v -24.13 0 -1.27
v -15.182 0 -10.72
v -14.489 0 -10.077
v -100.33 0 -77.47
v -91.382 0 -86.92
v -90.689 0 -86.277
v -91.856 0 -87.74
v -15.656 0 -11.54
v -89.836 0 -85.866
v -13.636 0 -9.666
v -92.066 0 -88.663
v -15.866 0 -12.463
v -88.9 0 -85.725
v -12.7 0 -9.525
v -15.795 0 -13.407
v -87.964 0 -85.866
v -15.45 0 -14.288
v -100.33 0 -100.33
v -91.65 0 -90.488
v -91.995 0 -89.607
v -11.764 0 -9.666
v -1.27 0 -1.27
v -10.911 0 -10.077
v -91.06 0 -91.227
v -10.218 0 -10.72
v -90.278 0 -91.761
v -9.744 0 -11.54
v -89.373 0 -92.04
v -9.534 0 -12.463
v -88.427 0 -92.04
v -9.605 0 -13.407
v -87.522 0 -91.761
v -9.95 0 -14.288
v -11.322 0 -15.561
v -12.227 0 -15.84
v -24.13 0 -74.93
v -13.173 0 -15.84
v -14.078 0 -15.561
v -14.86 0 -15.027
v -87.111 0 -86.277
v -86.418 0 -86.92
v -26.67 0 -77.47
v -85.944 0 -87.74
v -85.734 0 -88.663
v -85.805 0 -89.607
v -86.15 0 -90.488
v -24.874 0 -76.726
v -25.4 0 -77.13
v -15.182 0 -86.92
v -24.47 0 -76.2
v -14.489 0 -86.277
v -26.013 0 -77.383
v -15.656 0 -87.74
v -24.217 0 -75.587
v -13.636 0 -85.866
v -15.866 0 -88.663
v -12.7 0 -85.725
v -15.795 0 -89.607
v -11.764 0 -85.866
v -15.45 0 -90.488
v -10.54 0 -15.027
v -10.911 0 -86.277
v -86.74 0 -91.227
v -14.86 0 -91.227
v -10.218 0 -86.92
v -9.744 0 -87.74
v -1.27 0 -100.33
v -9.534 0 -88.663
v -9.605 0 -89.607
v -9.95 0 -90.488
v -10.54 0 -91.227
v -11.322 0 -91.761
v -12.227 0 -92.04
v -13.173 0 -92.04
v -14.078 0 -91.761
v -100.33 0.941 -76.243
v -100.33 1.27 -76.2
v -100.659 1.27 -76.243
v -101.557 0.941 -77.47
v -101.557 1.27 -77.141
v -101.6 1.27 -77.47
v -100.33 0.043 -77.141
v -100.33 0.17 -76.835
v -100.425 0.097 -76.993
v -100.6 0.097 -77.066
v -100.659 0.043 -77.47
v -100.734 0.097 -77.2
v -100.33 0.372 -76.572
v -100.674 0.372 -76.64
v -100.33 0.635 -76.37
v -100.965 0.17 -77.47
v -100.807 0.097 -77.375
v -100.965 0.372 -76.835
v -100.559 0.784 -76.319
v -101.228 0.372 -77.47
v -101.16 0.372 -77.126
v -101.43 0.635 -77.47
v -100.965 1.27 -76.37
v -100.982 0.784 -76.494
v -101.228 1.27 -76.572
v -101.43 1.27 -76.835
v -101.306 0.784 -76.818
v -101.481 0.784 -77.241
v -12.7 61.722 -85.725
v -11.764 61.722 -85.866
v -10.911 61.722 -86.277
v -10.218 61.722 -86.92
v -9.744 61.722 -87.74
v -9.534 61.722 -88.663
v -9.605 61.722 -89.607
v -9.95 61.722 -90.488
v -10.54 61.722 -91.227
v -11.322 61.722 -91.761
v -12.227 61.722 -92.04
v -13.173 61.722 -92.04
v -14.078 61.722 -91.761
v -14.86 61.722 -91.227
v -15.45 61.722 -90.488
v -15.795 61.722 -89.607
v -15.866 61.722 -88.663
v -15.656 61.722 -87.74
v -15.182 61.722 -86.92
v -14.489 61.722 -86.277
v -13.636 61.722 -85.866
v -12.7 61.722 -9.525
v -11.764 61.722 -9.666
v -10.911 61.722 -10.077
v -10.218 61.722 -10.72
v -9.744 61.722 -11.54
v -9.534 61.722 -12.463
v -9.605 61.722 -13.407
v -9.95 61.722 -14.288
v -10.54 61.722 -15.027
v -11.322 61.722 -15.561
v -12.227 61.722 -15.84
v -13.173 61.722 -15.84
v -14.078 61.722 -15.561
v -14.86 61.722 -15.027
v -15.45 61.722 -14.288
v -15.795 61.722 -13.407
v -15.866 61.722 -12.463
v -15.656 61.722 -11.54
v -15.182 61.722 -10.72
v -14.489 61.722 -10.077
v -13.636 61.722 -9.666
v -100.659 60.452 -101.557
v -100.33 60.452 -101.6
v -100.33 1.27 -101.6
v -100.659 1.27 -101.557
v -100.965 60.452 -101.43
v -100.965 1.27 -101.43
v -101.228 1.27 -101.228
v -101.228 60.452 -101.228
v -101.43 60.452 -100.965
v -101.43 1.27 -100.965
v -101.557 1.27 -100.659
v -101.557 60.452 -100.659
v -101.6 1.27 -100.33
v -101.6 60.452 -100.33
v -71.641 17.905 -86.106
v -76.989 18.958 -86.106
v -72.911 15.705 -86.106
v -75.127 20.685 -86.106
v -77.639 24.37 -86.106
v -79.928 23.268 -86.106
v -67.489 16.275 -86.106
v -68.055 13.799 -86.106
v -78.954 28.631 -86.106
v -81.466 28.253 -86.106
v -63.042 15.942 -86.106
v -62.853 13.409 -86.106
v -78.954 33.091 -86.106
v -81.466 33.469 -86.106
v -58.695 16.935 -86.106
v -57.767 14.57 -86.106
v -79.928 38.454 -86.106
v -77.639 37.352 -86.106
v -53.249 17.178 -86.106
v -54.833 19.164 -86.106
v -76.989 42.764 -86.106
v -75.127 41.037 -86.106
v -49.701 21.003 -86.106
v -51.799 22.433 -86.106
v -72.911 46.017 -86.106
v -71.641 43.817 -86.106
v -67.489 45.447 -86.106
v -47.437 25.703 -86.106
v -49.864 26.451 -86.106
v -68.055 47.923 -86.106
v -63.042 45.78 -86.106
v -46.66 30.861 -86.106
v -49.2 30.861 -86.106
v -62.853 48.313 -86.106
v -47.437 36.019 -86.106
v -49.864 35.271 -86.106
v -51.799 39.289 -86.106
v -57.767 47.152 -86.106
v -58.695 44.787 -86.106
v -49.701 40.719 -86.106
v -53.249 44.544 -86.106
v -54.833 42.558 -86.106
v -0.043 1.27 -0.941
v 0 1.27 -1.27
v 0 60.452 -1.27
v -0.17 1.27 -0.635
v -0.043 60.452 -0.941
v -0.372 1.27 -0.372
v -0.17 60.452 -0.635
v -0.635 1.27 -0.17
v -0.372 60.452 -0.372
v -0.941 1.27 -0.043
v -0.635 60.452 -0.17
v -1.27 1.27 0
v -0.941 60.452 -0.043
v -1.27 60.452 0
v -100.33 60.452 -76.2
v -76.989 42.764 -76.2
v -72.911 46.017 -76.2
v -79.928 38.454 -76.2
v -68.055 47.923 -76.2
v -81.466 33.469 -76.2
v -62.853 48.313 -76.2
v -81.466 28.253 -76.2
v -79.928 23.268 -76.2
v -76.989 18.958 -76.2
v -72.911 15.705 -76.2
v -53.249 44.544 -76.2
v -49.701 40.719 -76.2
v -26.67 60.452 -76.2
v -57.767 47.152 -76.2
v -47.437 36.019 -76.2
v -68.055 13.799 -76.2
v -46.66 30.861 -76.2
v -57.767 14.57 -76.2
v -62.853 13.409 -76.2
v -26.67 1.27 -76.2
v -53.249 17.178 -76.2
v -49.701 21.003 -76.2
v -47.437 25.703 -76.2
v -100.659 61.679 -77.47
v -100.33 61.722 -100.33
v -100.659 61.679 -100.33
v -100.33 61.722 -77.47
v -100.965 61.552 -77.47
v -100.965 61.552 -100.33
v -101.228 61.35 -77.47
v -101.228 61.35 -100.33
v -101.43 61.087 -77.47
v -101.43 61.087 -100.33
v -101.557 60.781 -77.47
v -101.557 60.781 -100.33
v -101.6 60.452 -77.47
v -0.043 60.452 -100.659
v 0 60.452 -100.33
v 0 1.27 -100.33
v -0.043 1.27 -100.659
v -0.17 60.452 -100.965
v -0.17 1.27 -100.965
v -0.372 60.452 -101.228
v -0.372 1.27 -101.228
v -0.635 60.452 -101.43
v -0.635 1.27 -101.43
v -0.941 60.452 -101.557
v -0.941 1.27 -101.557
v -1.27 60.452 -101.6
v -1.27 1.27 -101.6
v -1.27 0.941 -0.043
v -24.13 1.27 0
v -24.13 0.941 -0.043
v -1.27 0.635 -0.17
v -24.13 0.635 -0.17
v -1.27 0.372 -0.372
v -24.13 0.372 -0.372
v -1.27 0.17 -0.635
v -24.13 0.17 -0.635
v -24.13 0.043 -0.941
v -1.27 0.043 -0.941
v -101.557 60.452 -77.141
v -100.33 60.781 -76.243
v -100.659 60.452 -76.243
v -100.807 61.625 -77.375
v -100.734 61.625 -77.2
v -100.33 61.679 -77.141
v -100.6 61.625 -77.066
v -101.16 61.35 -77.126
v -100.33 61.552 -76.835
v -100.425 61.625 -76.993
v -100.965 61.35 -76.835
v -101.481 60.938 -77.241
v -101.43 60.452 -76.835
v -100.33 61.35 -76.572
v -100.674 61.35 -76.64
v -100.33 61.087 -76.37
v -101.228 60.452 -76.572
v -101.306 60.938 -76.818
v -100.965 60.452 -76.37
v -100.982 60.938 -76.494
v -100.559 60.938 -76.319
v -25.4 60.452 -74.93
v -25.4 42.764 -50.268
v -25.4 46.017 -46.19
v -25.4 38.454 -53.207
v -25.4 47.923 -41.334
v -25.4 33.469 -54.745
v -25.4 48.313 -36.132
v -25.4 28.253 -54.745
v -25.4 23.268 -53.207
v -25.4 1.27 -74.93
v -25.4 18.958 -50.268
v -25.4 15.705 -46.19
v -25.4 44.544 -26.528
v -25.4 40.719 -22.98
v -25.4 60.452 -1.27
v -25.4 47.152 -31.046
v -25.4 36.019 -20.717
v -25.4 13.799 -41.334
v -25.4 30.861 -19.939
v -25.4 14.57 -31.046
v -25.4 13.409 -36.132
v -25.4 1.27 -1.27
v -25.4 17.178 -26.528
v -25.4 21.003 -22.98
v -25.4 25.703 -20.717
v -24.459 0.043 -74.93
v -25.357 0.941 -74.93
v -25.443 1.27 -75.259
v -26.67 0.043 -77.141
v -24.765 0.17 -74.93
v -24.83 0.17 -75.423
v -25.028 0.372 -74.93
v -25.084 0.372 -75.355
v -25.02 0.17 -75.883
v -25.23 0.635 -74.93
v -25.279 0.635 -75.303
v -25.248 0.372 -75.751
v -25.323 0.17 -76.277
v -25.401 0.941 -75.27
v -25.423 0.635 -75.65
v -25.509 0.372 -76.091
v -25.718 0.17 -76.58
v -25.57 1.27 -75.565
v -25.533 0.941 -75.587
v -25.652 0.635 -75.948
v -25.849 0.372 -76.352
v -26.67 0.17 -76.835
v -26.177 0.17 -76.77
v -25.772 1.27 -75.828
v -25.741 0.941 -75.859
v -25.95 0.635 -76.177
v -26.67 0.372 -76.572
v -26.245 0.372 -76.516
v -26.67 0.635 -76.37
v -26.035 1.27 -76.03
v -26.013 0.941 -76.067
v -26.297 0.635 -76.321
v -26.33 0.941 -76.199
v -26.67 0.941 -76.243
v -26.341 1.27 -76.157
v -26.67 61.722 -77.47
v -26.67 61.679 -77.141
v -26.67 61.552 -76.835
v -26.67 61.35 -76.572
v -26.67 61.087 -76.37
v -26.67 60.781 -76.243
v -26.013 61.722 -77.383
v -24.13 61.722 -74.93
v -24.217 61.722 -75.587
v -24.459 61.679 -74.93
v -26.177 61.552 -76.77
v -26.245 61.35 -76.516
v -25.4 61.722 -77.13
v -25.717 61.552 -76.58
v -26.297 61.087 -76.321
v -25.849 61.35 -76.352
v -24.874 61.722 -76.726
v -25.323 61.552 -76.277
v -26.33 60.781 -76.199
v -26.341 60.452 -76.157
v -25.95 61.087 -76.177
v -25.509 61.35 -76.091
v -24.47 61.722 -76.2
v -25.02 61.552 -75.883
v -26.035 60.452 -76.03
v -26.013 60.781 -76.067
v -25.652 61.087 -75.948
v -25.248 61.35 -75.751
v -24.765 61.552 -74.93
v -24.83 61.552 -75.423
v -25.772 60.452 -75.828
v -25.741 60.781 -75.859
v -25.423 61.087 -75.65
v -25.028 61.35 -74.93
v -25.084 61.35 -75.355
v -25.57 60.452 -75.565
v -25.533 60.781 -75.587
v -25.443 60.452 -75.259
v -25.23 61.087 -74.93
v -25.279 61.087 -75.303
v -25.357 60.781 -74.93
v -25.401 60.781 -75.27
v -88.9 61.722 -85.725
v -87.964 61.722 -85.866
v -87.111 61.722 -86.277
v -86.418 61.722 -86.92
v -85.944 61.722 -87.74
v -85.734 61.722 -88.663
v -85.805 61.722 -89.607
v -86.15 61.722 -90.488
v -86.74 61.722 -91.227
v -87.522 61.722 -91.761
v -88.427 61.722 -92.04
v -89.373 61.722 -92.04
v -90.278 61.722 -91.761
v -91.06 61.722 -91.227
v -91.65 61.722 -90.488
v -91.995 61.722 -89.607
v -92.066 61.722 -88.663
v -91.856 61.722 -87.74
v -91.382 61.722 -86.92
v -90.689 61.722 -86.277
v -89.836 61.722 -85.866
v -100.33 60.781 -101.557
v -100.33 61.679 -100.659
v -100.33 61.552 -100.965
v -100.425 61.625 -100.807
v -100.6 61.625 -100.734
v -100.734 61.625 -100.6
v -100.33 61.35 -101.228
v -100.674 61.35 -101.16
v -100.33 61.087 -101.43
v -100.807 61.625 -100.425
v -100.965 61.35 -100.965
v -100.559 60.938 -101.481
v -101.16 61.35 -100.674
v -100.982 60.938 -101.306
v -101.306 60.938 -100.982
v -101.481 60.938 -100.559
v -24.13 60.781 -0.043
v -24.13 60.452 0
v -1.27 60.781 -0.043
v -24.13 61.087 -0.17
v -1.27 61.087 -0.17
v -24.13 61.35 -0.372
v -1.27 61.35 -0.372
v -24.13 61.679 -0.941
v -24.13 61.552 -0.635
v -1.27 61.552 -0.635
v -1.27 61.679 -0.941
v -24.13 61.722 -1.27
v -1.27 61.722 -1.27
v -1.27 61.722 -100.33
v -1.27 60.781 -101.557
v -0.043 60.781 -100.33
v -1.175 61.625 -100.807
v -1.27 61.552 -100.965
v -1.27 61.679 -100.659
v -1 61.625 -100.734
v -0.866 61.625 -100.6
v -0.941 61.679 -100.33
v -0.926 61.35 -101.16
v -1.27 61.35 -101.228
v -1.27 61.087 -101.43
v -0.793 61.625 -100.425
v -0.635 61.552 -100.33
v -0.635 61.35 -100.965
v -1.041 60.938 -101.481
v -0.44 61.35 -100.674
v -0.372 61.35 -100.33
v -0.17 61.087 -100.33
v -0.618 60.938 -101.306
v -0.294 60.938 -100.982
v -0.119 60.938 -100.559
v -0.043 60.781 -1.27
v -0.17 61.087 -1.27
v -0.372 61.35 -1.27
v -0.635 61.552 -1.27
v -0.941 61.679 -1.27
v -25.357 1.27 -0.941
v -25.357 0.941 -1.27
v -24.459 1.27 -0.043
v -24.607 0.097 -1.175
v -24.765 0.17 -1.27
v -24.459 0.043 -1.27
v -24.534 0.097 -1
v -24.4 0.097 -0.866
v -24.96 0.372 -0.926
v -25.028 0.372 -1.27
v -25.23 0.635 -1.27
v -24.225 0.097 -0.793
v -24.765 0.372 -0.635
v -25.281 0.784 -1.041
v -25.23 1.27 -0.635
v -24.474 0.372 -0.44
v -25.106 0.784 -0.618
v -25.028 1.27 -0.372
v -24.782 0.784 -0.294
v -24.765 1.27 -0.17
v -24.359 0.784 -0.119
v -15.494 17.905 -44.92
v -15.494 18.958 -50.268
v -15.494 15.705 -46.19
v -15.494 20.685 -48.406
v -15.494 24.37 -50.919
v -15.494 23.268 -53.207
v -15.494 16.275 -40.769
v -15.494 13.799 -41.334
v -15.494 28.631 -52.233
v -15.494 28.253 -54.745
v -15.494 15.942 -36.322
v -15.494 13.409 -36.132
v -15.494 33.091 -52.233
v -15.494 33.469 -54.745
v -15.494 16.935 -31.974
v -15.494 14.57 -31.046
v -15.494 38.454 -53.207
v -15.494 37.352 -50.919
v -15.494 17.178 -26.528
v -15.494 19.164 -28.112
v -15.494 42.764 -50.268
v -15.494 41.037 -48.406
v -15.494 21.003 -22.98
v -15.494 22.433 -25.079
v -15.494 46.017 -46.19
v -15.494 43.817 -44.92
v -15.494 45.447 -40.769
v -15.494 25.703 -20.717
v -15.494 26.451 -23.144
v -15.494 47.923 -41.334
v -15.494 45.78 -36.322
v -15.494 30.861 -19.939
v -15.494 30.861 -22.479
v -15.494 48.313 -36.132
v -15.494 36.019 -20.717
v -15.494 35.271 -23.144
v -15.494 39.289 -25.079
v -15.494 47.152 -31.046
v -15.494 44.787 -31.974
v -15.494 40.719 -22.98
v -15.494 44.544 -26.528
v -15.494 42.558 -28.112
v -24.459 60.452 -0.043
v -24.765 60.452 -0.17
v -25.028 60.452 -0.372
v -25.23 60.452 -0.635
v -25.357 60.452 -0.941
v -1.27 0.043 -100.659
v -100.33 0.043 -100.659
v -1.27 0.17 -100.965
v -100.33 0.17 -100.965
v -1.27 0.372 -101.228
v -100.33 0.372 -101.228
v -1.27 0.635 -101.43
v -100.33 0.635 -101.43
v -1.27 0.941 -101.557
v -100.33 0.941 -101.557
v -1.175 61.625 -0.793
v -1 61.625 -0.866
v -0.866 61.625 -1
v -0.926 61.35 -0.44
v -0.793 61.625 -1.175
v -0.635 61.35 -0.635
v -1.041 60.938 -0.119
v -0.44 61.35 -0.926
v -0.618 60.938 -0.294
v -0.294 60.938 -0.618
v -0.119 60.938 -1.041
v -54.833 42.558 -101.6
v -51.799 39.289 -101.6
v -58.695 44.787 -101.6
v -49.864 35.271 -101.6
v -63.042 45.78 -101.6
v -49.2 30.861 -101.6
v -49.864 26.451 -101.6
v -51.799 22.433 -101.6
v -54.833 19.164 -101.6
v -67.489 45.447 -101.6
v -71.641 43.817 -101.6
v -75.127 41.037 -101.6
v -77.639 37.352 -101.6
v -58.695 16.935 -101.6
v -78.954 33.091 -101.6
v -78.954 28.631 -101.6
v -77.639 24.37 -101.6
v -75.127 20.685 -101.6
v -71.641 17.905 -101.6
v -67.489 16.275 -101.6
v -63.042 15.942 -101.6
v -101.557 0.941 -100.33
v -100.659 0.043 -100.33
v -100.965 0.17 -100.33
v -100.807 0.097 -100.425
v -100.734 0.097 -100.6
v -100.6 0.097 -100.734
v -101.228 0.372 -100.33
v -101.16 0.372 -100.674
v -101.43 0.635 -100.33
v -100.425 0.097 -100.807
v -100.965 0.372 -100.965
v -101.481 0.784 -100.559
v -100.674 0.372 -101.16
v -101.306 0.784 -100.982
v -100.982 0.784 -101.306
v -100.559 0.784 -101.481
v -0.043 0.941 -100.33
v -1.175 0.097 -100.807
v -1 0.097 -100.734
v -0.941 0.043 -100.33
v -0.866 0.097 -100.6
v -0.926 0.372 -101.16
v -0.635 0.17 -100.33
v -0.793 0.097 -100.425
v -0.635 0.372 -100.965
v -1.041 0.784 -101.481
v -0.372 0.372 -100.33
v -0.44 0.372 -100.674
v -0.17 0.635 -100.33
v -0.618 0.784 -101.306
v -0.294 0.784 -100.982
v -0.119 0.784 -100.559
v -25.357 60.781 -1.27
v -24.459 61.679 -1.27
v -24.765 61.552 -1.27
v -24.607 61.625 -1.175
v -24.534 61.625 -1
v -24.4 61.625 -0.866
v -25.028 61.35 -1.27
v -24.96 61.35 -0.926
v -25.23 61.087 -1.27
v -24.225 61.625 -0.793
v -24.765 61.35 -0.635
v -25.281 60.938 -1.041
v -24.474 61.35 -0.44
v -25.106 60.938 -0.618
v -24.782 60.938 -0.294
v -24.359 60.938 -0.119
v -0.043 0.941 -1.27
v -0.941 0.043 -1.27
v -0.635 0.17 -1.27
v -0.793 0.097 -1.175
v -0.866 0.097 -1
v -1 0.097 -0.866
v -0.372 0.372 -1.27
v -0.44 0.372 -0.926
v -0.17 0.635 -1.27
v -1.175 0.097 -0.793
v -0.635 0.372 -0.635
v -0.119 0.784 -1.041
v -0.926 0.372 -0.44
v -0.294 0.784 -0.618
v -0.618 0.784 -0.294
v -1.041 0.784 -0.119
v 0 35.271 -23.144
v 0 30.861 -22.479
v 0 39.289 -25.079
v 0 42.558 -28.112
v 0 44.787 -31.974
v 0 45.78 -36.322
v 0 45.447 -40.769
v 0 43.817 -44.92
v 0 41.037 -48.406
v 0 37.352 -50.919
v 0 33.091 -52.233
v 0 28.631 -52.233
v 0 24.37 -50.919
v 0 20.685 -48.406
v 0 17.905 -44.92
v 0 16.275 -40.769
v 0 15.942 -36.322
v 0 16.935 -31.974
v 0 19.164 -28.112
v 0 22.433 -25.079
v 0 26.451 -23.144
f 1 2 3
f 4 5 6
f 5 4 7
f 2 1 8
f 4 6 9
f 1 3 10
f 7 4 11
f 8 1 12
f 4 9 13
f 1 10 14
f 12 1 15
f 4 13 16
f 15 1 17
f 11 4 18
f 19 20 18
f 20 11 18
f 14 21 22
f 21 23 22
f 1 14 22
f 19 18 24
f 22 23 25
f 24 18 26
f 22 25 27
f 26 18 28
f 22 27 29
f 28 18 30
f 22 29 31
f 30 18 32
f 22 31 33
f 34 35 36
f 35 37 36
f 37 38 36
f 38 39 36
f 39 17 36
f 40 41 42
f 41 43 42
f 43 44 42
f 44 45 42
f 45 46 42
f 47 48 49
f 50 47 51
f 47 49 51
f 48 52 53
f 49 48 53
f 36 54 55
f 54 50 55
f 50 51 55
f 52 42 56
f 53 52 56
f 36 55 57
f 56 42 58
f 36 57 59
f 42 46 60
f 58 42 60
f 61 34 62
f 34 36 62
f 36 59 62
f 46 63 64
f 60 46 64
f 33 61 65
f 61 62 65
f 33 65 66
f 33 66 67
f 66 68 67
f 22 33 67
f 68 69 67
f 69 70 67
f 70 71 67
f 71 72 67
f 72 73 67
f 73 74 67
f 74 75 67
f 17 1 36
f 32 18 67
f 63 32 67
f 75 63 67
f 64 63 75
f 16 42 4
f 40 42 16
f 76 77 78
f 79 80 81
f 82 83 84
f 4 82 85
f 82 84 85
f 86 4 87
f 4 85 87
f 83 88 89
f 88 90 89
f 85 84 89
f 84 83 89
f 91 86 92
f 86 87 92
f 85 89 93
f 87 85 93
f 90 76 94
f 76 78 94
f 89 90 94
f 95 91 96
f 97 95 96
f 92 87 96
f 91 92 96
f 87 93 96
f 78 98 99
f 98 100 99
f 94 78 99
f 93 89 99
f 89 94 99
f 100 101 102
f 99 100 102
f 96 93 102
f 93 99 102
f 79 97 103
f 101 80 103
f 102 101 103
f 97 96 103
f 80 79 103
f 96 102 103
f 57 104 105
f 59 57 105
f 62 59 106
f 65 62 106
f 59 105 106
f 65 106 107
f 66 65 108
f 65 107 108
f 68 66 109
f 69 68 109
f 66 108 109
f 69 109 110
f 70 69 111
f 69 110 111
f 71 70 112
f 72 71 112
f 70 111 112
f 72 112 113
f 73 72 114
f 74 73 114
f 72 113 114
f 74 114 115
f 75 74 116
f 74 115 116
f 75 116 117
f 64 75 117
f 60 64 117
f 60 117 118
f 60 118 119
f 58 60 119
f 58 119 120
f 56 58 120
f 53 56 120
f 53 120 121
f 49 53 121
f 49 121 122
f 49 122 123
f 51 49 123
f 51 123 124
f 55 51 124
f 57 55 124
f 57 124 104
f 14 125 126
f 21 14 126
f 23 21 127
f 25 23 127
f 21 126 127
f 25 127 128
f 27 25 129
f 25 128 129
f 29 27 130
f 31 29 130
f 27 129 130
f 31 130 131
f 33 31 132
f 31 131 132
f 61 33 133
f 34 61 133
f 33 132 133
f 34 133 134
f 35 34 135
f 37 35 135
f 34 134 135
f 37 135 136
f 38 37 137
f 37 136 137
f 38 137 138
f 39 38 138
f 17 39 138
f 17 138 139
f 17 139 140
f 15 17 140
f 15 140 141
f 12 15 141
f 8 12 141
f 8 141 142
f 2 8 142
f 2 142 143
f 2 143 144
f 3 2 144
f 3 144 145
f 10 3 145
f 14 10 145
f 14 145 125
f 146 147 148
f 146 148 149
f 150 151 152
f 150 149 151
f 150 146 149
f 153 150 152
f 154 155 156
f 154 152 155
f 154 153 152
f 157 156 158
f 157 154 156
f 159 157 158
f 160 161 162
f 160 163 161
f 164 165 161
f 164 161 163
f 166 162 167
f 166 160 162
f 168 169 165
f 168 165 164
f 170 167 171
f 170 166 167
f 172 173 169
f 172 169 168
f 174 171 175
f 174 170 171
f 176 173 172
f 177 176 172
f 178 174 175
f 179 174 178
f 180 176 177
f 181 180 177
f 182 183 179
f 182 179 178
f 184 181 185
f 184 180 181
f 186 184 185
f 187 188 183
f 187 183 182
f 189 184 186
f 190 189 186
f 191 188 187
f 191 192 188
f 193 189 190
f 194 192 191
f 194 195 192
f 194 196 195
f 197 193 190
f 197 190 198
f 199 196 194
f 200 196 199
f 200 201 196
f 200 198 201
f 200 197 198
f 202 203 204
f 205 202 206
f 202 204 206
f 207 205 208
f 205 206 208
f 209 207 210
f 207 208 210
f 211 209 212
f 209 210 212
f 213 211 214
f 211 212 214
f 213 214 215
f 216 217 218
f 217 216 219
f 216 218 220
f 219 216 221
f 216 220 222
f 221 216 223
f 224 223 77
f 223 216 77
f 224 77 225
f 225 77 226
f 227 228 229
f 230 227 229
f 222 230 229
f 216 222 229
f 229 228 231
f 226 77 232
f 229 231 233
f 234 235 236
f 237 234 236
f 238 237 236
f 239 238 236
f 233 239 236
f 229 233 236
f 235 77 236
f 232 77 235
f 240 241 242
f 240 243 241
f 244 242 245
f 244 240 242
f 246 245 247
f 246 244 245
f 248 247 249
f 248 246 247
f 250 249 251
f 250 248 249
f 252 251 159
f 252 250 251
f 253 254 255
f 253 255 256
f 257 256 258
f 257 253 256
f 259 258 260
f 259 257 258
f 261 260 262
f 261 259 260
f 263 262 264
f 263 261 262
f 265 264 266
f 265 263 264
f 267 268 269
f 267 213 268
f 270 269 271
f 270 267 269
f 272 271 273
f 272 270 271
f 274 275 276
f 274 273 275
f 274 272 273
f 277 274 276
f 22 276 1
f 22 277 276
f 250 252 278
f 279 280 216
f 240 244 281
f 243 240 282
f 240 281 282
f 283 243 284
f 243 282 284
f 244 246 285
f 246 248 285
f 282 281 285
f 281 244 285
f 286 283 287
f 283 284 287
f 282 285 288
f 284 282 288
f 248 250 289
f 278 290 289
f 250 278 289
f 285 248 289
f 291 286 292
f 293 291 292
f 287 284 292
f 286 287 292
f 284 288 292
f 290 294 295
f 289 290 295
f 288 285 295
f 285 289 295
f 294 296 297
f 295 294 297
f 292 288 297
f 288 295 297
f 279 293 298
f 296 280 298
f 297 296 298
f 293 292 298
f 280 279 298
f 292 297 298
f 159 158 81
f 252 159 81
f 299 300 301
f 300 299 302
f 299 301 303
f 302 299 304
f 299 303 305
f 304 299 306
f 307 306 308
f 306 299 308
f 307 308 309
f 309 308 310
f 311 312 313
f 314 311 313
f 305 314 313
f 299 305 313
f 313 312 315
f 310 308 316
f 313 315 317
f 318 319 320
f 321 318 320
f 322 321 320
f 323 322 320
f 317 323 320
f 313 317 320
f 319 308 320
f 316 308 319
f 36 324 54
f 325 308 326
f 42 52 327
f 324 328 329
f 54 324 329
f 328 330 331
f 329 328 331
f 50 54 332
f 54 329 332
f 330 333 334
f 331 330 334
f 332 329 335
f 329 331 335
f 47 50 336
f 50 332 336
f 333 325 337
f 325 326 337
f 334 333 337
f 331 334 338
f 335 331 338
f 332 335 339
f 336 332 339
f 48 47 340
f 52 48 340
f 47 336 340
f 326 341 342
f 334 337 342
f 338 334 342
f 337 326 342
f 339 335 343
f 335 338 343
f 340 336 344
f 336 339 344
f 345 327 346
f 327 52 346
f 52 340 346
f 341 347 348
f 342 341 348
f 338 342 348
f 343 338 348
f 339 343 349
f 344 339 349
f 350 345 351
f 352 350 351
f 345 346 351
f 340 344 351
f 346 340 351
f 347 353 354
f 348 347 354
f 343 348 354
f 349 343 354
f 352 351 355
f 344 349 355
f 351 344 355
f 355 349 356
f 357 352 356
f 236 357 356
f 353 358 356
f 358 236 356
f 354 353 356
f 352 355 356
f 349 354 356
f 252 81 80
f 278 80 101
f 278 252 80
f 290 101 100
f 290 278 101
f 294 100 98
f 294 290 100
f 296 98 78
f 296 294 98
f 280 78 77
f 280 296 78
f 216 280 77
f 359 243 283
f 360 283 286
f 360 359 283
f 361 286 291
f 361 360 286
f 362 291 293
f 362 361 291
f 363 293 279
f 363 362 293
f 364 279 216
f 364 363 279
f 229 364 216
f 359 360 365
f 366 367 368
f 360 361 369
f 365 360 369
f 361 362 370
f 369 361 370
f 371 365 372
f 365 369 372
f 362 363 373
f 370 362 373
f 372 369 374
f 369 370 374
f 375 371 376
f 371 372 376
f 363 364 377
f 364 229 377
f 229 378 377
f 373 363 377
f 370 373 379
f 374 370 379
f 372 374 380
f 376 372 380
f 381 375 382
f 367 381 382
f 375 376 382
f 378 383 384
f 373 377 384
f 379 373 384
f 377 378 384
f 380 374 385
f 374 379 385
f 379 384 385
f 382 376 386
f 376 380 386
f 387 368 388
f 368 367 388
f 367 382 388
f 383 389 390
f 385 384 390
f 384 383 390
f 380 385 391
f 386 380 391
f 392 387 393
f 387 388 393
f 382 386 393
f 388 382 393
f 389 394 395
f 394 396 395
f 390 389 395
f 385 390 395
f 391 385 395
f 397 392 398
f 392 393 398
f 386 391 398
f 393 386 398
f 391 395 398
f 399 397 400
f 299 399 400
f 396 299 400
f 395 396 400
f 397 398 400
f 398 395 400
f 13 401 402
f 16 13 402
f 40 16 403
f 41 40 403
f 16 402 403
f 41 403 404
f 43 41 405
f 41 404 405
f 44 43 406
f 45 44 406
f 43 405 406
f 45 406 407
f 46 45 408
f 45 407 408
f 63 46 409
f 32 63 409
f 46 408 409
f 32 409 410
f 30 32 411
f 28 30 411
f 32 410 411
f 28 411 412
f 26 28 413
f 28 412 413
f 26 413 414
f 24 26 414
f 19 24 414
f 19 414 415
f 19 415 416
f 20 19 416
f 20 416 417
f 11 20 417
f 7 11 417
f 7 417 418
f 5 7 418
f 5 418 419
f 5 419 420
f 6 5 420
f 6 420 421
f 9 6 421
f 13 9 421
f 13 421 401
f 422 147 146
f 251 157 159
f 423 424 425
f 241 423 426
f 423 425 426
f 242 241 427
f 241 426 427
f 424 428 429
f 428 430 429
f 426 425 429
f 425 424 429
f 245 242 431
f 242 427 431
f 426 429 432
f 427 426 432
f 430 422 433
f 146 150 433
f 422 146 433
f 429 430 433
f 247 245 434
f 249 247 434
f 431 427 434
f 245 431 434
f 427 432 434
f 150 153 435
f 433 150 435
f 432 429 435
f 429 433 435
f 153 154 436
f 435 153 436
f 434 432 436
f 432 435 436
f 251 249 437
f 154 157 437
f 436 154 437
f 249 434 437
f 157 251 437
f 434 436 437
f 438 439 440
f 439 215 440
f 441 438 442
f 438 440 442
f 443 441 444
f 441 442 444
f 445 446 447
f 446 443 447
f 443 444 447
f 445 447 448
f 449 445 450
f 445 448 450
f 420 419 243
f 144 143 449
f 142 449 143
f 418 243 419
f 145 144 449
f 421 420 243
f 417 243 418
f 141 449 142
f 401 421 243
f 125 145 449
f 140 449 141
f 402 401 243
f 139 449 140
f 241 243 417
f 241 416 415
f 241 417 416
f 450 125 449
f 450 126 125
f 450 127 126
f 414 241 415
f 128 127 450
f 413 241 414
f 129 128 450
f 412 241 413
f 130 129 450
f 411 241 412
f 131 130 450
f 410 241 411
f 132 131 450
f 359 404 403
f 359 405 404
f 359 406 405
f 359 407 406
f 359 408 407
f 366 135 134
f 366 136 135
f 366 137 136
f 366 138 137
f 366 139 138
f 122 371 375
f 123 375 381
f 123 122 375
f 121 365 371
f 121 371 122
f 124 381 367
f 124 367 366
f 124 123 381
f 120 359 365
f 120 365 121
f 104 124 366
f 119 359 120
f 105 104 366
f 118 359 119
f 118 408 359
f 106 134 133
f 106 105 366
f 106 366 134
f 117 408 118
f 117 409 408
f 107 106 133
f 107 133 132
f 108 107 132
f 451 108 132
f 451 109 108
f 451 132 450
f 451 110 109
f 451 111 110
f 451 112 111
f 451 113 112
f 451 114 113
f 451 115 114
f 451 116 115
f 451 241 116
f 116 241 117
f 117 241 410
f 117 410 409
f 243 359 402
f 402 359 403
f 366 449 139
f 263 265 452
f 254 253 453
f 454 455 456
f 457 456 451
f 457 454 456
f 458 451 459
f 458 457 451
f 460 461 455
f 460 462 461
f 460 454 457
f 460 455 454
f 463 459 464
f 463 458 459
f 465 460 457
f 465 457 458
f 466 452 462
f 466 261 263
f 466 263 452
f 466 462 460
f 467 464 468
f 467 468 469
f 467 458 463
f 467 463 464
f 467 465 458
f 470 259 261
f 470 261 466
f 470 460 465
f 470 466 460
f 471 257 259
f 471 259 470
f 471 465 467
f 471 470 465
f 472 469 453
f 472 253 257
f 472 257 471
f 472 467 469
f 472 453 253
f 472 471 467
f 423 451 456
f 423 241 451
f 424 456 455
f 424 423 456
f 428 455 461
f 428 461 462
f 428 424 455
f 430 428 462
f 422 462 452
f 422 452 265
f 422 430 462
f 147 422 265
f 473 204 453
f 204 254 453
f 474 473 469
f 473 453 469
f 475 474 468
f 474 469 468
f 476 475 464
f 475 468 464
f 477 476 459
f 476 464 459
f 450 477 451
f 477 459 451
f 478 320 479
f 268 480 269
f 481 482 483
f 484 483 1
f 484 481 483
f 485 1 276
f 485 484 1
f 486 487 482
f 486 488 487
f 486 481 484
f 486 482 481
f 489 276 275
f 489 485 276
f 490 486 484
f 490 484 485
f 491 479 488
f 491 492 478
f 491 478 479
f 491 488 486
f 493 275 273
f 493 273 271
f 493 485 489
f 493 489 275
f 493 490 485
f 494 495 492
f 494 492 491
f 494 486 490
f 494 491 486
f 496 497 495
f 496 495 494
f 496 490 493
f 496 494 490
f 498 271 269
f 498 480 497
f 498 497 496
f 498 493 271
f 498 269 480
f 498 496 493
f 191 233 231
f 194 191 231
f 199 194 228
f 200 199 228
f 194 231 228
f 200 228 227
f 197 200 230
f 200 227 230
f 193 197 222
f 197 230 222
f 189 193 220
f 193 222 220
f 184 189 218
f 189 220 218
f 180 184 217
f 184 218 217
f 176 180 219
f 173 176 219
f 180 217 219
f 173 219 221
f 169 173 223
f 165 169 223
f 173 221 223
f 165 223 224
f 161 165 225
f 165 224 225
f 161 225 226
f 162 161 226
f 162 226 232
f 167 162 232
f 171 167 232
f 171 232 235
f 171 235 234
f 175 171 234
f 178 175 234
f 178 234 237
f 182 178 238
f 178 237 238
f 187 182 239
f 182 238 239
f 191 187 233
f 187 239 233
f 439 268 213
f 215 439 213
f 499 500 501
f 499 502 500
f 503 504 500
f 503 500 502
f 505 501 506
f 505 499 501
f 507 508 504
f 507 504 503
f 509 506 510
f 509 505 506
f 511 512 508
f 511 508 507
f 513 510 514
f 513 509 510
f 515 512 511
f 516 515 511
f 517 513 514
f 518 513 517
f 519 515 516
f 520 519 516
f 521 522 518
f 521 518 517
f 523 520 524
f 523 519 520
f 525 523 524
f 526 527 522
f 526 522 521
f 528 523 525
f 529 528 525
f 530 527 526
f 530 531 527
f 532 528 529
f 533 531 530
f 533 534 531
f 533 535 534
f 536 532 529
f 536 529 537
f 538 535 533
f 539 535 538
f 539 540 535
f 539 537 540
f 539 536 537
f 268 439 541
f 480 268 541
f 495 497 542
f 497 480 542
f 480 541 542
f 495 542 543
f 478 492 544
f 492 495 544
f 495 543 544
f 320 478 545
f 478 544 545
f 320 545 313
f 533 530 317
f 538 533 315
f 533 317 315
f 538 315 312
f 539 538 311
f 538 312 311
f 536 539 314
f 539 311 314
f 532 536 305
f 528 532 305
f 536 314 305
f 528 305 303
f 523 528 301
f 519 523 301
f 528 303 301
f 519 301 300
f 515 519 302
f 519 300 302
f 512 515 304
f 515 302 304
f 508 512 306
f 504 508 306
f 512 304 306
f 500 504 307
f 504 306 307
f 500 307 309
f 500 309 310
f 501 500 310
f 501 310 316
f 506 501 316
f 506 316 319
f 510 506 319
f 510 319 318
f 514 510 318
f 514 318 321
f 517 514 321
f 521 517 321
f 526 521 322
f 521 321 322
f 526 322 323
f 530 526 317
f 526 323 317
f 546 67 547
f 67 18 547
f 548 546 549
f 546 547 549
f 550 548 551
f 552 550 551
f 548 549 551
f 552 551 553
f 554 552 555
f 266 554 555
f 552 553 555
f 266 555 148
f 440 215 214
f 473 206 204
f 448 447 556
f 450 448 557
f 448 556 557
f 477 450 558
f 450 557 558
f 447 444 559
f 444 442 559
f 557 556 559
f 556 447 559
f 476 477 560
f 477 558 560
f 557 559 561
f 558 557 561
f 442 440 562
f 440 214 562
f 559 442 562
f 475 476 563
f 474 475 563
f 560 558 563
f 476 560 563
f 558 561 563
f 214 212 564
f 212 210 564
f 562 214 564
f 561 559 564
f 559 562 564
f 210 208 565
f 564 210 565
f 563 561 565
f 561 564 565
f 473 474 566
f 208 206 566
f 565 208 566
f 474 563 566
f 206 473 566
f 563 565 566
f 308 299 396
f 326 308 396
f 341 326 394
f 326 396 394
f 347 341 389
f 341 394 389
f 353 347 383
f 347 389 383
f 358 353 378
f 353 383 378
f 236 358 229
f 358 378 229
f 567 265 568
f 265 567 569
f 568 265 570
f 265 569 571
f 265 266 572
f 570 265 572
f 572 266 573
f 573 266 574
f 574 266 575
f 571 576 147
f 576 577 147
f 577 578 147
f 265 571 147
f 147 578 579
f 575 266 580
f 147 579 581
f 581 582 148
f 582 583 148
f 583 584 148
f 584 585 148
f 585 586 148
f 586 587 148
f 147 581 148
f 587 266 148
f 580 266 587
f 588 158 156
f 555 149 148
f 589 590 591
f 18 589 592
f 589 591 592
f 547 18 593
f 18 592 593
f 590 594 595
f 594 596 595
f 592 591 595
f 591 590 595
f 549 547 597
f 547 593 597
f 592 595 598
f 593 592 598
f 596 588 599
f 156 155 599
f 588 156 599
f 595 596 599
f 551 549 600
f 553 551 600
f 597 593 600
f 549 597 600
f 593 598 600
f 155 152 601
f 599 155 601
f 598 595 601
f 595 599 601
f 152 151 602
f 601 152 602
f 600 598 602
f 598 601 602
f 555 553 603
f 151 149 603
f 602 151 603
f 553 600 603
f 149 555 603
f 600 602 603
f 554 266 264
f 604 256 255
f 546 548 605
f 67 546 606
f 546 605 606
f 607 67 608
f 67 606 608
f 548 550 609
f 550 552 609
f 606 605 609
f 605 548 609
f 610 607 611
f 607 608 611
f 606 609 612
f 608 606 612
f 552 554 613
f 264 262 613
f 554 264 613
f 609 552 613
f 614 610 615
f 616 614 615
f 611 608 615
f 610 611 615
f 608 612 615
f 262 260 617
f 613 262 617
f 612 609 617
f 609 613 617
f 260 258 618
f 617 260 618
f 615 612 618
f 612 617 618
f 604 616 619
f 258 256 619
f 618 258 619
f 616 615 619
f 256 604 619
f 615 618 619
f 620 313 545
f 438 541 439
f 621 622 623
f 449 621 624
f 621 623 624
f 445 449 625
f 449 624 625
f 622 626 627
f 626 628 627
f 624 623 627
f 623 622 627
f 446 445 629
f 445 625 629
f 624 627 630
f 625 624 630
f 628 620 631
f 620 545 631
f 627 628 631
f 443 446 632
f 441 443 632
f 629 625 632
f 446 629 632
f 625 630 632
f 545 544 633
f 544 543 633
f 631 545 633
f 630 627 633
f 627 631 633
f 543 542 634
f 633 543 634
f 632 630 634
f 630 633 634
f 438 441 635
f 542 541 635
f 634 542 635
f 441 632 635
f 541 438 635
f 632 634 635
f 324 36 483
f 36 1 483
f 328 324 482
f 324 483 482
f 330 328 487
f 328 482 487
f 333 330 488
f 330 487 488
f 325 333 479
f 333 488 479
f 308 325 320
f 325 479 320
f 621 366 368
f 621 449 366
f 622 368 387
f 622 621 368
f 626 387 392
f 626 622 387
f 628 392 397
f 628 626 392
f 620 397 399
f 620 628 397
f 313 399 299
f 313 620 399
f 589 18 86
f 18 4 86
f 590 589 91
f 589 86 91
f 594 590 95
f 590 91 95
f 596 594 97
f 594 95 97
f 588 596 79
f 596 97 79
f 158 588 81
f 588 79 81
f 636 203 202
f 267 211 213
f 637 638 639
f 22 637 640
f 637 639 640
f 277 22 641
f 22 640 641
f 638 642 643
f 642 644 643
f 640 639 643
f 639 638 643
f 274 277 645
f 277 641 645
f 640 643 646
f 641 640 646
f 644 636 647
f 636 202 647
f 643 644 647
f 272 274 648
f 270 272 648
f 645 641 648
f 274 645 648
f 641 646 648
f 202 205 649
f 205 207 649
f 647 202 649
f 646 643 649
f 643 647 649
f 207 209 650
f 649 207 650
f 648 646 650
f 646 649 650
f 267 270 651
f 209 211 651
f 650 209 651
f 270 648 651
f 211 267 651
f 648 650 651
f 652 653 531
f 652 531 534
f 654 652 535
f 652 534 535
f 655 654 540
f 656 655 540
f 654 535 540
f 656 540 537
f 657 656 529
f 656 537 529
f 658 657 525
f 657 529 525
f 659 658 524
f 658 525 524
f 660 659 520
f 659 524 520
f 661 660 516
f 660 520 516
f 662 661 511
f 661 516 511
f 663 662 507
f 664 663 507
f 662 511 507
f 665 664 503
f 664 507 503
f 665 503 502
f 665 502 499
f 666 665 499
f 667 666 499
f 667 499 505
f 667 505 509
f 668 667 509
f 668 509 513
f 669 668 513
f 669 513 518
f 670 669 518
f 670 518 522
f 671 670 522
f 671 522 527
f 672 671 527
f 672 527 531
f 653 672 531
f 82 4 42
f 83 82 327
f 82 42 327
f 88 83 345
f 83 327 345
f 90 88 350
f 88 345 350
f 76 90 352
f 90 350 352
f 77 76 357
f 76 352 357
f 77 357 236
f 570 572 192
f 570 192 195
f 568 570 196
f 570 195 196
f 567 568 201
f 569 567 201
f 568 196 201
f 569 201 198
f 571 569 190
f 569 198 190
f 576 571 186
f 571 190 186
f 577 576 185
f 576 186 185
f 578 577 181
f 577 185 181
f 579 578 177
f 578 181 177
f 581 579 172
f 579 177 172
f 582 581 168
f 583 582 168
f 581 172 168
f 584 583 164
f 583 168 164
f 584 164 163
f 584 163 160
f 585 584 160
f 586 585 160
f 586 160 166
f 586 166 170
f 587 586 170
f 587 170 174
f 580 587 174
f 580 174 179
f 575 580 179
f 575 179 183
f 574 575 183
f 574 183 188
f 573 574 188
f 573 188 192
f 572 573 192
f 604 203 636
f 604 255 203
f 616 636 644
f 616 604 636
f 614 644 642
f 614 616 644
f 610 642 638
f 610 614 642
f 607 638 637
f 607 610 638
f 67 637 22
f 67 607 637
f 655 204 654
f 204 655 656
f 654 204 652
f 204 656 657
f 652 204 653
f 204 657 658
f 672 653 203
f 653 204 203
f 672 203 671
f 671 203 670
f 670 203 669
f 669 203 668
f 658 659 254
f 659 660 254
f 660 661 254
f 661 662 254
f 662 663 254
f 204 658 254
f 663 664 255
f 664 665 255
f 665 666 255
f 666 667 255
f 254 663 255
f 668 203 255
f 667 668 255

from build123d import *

# Parameters (mm, degrees)
BOSS_EXTRUDE1_DEPTH = 61.722
SKETCH3_R           = 17.5006
CUT_EXTRUDE1_DEPTH  = 9.906
SKETCH4_R           = 14.9606
CUT_EXTRUDE2_DEPTH  = 147.78694942
SKETCH5_R           = 3.175
CUT_EXTRUDE3_DEPTH  = 157.380066773
SKETCH6_R           = 17.5006
CUT_EXTRUDE4_DEPTH  = 9.906
SKETCH7_R           = 14.9606
CUT_EXTRUDE5_DEPTH  = 147.78694942
FILLET1_R           = 1.27


with BuildPart() as part:
    # Sketch2 → Boss-Extrude1 (new body)
    with BuildSketch(Plane(origin=(0, 0, 0), x_dir=(1, 0, 0), z_dir=(0, 1, 0))):
        Polygon((0, 0), (0, 101.6), (-101.6, 101.6), (-101.6, 76.2), (-25.4, 76.2), (-25.4, 0), align=None)
    extrude(amount=BOSS_EXTRUDE1_DEPTH)

    # Sketch3 → Cut-Extrude1 (cut)
    with BuildSketch(Plane.XY.offset(-76.2)):
        with Locations((-64.1604, 30.861)):
            Circle(SKETCH3_R)
    extrude(amount=-CUT_EXTRUDE1_DEPTH, mode=Mode.SUBTRACT)

    # Sketch4 → Cut-Extrude2 (cut, through all)
    with BuildSketch(Plane.XY.offset(-86.106)):
        with Locations((-64.1604, 30.861)):
            Circle(SKETCH4_R)
    extrude(amount=-CUT_EXTRUDE2_DEPTH, mode=Mode.SUBTRACT)

    # Sketch5 → Cut-Extrude3 (cut, through all)
    with BuildSketch(Plane(origin=(0, 61.722, 0), x_dir=(1, 0, 0), z_dir=(0, 1, 0))):
        with Locations(Location((-88.9, 88.9, 0), (0, 0, 270))):
            Circle(SKETCH5_R)
        with Locations(Location((-12.7, 88.9, 0), (0, 0, 270))):
            Circle(SKETCH5_R)
        with Locations(Location((-12.7, 12.7, 0), (0, 0, 270))):
            Circle(SKETCH5_R)
    extrude(amount=-CUT_EXTRUDE3_DEPTH, mode=Mode.SUBTRACT)

    # Sketch6 → Cut-Extrude4 (cut)
    with BuildSketch(Plane.ZY.offset(25.4)):
        with Locations((-37.4396, 30.861)):
            Circle(SKETCH6_R)
    extrude(amount=-CUT_EXTRUDE4_DEPTH, mode=Mode.SUBTRACT)

    # Sketch7 → Cut-Extrude5 (cut, through all)
    with BuildSketch(Plane.ZY.offset(15.494)):
        with Locations((-37.4396, 30.861)):
            Circle(SKETCH7_R)
    extrude(amount=-CUT_EXTRUDE5_DEPTH, mode=Mode.SUBTRACT)

    # Fillet1
    fillet1_edges = [part.edges().sort_by_distance(p)[0] for p in [
        (-25.4, 30.861, 0),
        (-25.4, 30.861, -76.2),
        (-101.6, 30.861, -76.2),
        (-101.6, 30.861, -101.6),
        (0, 30.861, -101.6),
        (0, 30.861, 0),
        (-50.8, 61.722, -101.6),
        (-101.6, 61.722, -88.9),
        (-63.5, 61.722, -76.2),
        (-25.4, 61.722, -38.1),
        (-12.7, 61.722, 0),
        (-25.4, 0, -38.1),
        (-63.5, 0, -76.2),
        (-101.6, 0, -88.9),
        (-50.8, 0, -101.6),
        (0, 0, -50.8),
        (-12.7, 0, 0),
        (0, 61.722, -50.8),
    ]]
    fillet(fillet1_edges, radius=FILLET1_R)


solid = part.part
